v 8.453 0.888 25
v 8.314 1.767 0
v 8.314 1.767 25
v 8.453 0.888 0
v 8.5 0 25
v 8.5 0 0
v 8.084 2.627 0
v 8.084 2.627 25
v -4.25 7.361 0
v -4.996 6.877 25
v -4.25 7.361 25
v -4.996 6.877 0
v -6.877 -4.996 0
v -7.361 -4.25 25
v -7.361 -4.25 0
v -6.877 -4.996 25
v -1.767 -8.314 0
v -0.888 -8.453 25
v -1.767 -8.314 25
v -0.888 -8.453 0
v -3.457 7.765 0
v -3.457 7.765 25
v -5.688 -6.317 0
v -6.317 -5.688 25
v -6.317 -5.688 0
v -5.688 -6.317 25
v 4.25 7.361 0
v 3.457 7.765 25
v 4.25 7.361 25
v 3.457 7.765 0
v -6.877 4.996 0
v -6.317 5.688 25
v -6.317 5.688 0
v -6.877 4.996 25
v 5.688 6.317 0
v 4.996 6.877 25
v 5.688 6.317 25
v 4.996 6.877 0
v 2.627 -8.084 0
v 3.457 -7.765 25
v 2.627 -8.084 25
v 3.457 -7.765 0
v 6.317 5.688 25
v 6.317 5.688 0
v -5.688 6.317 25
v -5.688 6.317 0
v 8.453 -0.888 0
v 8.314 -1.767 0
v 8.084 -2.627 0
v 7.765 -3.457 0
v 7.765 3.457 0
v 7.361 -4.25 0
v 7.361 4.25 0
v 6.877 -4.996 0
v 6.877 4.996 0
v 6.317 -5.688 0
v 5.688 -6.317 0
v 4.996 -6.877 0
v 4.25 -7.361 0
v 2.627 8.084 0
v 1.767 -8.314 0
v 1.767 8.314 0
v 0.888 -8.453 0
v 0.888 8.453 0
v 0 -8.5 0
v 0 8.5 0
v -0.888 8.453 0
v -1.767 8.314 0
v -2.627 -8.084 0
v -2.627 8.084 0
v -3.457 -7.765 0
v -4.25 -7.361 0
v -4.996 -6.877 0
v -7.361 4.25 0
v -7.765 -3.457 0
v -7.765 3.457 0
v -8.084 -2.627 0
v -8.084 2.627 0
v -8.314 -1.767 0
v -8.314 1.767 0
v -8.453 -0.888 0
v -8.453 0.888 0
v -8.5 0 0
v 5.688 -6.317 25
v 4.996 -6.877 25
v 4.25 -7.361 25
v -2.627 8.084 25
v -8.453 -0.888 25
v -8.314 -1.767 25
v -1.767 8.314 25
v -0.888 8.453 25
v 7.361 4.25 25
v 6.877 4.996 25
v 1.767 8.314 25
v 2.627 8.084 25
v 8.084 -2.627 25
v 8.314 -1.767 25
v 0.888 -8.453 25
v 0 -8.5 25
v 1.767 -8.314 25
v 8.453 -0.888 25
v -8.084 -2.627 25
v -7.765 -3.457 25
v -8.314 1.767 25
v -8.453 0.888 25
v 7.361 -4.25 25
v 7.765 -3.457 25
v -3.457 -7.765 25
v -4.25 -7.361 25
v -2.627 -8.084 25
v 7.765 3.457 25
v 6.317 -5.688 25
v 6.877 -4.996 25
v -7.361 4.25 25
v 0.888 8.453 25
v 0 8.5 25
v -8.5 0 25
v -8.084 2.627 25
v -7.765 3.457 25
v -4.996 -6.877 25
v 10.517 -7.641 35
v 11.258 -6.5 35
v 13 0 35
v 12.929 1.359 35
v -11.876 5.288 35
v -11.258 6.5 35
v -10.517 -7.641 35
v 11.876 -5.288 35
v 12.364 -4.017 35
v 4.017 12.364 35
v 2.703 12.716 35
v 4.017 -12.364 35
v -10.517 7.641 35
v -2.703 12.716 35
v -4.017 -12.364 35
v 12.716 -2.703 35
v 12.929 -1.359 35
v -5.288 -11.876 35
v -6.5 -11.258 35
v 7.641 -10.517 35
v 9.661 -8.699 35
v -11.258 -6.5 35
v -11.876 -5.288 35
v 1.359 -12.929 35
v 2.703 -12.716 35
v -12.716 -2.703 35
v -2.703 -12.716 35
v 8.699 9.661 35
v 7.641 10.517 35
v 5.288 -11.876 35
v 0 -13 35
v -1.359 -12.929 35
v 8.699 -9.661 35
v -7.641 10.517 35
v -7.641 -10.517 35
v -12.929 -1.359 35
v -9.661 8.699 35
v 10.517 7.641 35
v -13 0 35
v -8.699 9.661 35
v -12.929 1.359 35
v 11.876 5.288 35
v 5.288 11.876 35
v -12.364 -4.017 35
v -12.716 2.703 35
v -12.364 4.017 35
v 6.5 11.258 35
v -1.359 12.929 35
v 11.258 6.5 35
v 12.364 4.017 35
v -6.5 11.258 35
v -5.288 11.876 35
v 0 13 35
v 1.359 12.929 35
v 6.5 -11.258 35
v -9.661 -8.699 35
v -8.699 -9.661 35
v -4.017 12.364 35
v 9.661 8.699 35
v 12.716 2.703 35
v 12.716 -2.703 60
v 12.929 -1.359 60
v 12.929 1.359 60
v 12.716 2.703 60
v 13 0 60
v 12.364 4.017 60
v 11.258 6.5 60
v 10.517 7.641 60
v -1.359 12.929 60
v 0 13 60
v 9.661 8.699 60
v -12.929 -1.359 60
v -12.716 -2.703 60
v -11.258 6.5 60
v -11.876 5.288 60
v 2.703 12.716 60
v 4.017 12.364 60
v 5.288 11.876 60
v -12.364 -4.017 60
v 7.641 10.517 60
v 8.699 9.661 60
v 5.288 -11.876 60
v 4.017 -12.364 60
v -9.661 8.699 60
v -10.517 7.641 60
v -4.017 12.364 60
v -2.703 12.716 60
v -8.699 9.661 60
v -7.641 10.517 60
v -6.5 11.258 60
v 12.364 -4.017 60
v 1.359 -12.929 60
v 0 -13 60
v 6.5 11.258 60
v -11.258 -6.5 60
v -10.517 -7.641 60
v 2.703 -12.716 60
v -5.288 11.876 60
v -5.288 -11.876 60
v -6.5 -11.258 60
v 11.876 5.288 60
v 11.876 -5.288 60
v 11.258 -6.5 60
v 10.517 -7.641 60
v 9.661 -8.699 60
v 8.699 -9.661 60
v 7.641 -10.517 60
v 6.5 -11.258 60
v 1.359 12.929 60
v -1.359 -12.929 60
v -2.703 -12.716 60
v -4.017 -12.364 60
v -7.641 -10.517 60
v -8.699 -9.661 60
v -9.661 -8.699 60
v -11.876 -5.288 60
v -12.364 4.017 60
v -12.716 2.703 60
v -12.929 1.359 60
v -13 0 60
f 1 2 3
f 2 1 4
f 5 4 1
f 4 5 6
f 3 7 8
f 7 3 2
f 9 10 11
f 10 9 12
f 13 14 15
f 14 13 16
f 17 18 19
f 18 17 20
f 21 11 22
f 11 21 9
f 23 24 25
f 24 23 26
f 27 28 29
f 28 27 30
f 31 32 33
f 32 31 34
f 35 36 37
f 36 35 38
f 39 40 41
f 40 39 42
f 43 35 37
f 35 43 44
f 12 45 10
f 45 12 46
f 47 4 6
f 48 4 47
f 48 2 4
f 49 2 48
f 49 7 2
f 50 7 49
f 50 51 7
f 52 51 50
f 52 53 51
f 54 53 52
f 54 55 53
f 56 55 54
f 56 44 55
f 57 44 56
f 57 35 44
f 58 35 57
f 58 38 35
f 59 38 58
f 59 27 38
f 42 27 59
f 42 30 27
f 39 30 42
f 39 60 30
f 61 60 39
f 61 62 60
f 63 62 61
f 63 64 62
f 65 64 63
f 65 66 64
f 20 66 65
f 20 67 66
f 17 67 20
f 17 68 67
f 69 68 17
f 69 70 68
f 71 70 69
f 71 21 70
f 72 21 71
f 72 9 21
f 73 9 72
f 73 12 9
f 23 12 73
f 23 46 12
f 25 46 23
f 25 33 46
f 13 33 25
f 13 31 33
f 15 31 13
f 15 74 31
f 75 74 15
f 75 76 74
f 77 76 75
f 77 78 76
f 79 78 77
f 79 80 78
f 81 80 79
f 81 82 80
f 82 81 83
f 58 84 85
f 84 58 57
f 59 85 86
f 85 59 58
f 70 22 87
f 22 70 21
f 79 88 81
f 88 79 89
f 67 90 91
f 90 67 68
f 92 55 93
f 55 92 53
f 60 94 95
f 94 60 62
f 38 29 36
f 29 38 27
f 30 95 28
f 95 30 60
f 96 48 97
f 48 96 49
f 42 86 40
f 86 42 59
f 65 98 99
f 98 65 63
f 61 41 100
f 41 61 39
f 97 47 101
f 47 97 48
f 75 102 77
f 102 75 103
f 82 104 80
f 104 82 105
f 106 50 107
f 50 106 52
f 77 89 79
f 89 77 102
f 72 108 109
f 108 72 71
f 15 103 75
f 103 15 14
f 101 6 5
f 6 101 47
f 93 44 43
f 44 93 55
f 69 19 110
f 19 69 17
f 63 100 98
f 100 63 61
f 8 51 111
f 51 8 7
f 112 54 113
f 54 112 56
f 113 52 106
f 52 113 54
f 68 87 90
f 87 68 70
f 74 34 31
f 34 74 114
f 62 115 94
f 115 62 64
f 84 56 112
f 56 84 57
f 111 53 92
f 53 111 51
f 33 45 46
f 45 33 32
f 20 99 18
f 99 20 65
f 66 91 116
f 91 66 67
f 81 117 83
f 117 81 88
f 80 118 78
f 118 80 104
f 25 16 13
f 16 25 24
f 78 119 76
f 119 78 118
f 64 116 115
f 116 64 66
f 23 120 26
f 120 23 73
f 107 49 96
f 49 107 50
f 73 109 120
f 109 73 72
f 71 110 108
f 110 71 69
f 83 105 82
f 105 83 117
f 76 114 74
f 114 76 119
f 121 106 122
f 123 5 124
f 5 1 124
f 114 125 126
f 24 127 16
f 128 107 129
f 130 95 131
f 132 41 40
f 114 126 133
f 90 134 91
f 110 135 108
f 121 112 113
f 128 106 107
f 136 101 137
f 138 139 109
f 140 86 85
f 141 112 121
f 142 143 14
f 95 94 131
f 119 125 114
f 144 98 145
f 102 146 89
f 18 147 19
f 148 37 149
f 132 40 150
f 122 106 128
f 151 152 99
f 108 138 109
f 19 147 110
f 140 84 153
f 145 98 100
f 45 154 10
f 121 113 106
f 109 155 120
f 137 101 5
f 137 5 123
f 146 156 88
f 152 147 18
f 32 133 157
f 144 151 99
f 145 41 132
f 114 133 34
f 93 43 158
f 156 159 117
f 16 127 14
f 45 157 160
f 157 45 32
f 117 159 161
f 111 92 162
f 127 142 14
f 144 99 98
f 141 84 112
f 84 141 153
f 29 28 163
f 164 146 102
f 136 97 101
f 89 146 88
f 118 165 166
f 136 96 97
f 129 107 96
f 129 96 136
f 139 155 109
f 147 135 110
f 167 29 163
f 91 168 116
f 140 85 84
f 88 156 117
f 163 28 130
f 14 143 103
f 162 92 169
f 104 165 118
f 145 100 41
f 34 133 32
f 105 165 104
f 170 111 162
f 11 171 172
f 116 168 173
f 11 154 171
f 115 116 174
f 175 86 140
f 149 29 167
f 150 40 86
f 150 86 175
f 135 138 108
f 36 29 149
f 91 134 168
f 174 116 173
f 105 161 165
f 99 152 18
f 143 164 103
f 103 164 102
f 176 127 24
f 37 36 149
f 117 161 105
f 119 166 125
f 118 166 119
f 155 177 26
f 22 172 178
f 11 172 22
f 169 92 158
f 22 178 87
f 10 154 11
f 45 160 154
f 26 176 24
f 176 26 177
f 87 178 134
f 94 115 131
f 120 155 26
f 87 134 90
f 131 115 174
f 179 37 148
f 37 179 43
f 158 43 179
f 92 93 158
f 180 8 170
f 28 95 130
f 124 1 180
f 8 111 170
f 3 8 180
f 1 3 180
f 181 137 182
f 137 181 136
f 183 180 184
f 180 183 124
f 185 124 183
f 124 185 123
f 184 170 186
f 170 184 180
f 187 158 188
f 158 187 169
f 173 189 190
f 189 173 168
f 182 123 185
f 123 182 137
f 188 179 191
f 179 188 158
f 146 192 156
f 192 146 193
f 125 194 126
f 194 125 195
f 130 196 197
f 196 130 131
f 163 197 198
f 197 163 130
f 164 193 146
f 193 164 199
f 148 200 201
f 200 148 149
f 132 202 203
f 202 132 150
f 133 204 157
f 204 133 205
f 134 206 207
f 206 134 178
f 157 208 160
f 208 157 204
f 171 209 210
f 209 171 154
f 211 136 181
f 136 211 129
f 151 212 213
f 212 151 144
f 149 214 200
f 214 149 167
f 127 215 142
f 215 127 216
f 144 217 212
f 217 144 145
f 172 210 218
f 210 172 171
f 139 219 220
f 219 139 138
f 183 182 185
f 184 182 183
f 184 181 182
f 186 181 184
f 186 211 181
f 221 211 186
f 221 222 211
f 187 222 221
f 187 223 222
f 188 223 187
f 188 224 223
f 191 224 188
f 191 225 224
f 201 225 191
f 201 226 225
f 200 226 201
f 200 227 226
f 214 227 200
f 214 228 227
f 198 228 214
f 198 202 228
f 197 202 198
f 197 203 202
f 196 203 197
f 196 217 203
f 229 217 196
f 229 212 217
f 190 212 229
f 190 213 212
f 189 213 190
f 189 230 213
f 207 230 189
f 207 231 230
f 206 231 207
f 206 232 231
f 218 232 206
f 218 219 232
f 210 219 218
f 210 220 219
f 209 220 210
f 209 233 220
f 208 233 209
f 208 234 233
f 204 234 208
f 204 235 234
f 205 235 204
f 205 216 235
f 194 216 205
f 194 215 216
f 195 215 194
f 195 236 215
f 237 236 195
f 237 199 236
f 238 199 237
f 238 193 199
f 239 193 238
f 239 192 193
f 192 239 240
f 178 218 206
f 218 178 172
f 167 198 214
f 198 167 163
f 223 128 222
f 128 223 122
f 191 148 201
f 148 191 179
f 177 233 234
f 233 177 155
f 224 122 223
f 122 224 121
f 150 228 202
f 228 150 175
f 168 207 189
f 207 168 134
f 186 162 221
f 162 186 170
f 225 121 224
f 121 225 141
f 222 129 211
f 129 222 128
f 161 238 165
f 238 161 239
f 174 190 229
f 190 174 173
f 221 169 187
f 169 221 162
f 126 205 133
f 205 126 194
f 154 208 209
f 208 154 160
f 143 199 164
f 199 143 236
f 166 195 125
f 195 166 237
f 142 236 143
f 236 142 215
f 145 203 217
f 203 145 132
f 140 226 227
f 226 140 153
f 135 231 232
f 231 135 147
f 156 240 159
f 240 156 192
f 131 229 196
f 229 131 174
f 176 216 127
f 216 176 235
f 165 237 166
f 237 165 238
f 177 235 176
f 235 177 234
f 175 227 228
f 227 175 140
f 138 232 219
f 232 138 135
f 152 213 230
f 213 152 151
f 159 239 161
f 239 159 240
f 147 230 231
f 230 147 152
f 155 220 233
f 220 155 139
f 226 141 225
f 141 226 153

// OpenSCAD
//
// PARAMETRIC SHUNNEL: SHAMPOO FUNNEL
//
// For decanting shampoo from one bottle to another.
//
// Author: RobotAnna
// https://www.printables.com/@RobotAnna
// 
// CC Attribution-NonCommercial-ShareAlike 4.0 International
// http://creativecommons.org/licenses/by-nc-sa/4.0/



// PARAMETERS
dia_outer =  26; // outer diameter of the shampoo bottle, give 2mm tolerance
dia_inner =  17; // inner diameter of the shampoo bottle, give 2mm tolerance
smoothing =  60; // cylinder smoothing: set to 60 while designing, and up to 300 for the final render.



// CONSTANTS
transition = 10; // you need approx 10mm to transition from large to small
height     = 25; // height of each side. 25mm keeps the bottles balancing without support.



// DERIVED



// MODULES



// PUT IT ALL TOGETHER
// colors are not necessary, this just helps to debug the code

color("LightGreen")
translate([0,0,0])
cylinder(h=height, d=dia_inner, center=false, $fn=smoothing);

color("LightPink")
translate([0,0,height])
cylinder(h=transition, d1=dia_inner, d2=dia_outer, center=false, $fn=smoothing); 

color("Wheat")
translate([0,0,transition+height])
cylinder(h=height, d=dia_outer, center=false, $fn=smoothing);
